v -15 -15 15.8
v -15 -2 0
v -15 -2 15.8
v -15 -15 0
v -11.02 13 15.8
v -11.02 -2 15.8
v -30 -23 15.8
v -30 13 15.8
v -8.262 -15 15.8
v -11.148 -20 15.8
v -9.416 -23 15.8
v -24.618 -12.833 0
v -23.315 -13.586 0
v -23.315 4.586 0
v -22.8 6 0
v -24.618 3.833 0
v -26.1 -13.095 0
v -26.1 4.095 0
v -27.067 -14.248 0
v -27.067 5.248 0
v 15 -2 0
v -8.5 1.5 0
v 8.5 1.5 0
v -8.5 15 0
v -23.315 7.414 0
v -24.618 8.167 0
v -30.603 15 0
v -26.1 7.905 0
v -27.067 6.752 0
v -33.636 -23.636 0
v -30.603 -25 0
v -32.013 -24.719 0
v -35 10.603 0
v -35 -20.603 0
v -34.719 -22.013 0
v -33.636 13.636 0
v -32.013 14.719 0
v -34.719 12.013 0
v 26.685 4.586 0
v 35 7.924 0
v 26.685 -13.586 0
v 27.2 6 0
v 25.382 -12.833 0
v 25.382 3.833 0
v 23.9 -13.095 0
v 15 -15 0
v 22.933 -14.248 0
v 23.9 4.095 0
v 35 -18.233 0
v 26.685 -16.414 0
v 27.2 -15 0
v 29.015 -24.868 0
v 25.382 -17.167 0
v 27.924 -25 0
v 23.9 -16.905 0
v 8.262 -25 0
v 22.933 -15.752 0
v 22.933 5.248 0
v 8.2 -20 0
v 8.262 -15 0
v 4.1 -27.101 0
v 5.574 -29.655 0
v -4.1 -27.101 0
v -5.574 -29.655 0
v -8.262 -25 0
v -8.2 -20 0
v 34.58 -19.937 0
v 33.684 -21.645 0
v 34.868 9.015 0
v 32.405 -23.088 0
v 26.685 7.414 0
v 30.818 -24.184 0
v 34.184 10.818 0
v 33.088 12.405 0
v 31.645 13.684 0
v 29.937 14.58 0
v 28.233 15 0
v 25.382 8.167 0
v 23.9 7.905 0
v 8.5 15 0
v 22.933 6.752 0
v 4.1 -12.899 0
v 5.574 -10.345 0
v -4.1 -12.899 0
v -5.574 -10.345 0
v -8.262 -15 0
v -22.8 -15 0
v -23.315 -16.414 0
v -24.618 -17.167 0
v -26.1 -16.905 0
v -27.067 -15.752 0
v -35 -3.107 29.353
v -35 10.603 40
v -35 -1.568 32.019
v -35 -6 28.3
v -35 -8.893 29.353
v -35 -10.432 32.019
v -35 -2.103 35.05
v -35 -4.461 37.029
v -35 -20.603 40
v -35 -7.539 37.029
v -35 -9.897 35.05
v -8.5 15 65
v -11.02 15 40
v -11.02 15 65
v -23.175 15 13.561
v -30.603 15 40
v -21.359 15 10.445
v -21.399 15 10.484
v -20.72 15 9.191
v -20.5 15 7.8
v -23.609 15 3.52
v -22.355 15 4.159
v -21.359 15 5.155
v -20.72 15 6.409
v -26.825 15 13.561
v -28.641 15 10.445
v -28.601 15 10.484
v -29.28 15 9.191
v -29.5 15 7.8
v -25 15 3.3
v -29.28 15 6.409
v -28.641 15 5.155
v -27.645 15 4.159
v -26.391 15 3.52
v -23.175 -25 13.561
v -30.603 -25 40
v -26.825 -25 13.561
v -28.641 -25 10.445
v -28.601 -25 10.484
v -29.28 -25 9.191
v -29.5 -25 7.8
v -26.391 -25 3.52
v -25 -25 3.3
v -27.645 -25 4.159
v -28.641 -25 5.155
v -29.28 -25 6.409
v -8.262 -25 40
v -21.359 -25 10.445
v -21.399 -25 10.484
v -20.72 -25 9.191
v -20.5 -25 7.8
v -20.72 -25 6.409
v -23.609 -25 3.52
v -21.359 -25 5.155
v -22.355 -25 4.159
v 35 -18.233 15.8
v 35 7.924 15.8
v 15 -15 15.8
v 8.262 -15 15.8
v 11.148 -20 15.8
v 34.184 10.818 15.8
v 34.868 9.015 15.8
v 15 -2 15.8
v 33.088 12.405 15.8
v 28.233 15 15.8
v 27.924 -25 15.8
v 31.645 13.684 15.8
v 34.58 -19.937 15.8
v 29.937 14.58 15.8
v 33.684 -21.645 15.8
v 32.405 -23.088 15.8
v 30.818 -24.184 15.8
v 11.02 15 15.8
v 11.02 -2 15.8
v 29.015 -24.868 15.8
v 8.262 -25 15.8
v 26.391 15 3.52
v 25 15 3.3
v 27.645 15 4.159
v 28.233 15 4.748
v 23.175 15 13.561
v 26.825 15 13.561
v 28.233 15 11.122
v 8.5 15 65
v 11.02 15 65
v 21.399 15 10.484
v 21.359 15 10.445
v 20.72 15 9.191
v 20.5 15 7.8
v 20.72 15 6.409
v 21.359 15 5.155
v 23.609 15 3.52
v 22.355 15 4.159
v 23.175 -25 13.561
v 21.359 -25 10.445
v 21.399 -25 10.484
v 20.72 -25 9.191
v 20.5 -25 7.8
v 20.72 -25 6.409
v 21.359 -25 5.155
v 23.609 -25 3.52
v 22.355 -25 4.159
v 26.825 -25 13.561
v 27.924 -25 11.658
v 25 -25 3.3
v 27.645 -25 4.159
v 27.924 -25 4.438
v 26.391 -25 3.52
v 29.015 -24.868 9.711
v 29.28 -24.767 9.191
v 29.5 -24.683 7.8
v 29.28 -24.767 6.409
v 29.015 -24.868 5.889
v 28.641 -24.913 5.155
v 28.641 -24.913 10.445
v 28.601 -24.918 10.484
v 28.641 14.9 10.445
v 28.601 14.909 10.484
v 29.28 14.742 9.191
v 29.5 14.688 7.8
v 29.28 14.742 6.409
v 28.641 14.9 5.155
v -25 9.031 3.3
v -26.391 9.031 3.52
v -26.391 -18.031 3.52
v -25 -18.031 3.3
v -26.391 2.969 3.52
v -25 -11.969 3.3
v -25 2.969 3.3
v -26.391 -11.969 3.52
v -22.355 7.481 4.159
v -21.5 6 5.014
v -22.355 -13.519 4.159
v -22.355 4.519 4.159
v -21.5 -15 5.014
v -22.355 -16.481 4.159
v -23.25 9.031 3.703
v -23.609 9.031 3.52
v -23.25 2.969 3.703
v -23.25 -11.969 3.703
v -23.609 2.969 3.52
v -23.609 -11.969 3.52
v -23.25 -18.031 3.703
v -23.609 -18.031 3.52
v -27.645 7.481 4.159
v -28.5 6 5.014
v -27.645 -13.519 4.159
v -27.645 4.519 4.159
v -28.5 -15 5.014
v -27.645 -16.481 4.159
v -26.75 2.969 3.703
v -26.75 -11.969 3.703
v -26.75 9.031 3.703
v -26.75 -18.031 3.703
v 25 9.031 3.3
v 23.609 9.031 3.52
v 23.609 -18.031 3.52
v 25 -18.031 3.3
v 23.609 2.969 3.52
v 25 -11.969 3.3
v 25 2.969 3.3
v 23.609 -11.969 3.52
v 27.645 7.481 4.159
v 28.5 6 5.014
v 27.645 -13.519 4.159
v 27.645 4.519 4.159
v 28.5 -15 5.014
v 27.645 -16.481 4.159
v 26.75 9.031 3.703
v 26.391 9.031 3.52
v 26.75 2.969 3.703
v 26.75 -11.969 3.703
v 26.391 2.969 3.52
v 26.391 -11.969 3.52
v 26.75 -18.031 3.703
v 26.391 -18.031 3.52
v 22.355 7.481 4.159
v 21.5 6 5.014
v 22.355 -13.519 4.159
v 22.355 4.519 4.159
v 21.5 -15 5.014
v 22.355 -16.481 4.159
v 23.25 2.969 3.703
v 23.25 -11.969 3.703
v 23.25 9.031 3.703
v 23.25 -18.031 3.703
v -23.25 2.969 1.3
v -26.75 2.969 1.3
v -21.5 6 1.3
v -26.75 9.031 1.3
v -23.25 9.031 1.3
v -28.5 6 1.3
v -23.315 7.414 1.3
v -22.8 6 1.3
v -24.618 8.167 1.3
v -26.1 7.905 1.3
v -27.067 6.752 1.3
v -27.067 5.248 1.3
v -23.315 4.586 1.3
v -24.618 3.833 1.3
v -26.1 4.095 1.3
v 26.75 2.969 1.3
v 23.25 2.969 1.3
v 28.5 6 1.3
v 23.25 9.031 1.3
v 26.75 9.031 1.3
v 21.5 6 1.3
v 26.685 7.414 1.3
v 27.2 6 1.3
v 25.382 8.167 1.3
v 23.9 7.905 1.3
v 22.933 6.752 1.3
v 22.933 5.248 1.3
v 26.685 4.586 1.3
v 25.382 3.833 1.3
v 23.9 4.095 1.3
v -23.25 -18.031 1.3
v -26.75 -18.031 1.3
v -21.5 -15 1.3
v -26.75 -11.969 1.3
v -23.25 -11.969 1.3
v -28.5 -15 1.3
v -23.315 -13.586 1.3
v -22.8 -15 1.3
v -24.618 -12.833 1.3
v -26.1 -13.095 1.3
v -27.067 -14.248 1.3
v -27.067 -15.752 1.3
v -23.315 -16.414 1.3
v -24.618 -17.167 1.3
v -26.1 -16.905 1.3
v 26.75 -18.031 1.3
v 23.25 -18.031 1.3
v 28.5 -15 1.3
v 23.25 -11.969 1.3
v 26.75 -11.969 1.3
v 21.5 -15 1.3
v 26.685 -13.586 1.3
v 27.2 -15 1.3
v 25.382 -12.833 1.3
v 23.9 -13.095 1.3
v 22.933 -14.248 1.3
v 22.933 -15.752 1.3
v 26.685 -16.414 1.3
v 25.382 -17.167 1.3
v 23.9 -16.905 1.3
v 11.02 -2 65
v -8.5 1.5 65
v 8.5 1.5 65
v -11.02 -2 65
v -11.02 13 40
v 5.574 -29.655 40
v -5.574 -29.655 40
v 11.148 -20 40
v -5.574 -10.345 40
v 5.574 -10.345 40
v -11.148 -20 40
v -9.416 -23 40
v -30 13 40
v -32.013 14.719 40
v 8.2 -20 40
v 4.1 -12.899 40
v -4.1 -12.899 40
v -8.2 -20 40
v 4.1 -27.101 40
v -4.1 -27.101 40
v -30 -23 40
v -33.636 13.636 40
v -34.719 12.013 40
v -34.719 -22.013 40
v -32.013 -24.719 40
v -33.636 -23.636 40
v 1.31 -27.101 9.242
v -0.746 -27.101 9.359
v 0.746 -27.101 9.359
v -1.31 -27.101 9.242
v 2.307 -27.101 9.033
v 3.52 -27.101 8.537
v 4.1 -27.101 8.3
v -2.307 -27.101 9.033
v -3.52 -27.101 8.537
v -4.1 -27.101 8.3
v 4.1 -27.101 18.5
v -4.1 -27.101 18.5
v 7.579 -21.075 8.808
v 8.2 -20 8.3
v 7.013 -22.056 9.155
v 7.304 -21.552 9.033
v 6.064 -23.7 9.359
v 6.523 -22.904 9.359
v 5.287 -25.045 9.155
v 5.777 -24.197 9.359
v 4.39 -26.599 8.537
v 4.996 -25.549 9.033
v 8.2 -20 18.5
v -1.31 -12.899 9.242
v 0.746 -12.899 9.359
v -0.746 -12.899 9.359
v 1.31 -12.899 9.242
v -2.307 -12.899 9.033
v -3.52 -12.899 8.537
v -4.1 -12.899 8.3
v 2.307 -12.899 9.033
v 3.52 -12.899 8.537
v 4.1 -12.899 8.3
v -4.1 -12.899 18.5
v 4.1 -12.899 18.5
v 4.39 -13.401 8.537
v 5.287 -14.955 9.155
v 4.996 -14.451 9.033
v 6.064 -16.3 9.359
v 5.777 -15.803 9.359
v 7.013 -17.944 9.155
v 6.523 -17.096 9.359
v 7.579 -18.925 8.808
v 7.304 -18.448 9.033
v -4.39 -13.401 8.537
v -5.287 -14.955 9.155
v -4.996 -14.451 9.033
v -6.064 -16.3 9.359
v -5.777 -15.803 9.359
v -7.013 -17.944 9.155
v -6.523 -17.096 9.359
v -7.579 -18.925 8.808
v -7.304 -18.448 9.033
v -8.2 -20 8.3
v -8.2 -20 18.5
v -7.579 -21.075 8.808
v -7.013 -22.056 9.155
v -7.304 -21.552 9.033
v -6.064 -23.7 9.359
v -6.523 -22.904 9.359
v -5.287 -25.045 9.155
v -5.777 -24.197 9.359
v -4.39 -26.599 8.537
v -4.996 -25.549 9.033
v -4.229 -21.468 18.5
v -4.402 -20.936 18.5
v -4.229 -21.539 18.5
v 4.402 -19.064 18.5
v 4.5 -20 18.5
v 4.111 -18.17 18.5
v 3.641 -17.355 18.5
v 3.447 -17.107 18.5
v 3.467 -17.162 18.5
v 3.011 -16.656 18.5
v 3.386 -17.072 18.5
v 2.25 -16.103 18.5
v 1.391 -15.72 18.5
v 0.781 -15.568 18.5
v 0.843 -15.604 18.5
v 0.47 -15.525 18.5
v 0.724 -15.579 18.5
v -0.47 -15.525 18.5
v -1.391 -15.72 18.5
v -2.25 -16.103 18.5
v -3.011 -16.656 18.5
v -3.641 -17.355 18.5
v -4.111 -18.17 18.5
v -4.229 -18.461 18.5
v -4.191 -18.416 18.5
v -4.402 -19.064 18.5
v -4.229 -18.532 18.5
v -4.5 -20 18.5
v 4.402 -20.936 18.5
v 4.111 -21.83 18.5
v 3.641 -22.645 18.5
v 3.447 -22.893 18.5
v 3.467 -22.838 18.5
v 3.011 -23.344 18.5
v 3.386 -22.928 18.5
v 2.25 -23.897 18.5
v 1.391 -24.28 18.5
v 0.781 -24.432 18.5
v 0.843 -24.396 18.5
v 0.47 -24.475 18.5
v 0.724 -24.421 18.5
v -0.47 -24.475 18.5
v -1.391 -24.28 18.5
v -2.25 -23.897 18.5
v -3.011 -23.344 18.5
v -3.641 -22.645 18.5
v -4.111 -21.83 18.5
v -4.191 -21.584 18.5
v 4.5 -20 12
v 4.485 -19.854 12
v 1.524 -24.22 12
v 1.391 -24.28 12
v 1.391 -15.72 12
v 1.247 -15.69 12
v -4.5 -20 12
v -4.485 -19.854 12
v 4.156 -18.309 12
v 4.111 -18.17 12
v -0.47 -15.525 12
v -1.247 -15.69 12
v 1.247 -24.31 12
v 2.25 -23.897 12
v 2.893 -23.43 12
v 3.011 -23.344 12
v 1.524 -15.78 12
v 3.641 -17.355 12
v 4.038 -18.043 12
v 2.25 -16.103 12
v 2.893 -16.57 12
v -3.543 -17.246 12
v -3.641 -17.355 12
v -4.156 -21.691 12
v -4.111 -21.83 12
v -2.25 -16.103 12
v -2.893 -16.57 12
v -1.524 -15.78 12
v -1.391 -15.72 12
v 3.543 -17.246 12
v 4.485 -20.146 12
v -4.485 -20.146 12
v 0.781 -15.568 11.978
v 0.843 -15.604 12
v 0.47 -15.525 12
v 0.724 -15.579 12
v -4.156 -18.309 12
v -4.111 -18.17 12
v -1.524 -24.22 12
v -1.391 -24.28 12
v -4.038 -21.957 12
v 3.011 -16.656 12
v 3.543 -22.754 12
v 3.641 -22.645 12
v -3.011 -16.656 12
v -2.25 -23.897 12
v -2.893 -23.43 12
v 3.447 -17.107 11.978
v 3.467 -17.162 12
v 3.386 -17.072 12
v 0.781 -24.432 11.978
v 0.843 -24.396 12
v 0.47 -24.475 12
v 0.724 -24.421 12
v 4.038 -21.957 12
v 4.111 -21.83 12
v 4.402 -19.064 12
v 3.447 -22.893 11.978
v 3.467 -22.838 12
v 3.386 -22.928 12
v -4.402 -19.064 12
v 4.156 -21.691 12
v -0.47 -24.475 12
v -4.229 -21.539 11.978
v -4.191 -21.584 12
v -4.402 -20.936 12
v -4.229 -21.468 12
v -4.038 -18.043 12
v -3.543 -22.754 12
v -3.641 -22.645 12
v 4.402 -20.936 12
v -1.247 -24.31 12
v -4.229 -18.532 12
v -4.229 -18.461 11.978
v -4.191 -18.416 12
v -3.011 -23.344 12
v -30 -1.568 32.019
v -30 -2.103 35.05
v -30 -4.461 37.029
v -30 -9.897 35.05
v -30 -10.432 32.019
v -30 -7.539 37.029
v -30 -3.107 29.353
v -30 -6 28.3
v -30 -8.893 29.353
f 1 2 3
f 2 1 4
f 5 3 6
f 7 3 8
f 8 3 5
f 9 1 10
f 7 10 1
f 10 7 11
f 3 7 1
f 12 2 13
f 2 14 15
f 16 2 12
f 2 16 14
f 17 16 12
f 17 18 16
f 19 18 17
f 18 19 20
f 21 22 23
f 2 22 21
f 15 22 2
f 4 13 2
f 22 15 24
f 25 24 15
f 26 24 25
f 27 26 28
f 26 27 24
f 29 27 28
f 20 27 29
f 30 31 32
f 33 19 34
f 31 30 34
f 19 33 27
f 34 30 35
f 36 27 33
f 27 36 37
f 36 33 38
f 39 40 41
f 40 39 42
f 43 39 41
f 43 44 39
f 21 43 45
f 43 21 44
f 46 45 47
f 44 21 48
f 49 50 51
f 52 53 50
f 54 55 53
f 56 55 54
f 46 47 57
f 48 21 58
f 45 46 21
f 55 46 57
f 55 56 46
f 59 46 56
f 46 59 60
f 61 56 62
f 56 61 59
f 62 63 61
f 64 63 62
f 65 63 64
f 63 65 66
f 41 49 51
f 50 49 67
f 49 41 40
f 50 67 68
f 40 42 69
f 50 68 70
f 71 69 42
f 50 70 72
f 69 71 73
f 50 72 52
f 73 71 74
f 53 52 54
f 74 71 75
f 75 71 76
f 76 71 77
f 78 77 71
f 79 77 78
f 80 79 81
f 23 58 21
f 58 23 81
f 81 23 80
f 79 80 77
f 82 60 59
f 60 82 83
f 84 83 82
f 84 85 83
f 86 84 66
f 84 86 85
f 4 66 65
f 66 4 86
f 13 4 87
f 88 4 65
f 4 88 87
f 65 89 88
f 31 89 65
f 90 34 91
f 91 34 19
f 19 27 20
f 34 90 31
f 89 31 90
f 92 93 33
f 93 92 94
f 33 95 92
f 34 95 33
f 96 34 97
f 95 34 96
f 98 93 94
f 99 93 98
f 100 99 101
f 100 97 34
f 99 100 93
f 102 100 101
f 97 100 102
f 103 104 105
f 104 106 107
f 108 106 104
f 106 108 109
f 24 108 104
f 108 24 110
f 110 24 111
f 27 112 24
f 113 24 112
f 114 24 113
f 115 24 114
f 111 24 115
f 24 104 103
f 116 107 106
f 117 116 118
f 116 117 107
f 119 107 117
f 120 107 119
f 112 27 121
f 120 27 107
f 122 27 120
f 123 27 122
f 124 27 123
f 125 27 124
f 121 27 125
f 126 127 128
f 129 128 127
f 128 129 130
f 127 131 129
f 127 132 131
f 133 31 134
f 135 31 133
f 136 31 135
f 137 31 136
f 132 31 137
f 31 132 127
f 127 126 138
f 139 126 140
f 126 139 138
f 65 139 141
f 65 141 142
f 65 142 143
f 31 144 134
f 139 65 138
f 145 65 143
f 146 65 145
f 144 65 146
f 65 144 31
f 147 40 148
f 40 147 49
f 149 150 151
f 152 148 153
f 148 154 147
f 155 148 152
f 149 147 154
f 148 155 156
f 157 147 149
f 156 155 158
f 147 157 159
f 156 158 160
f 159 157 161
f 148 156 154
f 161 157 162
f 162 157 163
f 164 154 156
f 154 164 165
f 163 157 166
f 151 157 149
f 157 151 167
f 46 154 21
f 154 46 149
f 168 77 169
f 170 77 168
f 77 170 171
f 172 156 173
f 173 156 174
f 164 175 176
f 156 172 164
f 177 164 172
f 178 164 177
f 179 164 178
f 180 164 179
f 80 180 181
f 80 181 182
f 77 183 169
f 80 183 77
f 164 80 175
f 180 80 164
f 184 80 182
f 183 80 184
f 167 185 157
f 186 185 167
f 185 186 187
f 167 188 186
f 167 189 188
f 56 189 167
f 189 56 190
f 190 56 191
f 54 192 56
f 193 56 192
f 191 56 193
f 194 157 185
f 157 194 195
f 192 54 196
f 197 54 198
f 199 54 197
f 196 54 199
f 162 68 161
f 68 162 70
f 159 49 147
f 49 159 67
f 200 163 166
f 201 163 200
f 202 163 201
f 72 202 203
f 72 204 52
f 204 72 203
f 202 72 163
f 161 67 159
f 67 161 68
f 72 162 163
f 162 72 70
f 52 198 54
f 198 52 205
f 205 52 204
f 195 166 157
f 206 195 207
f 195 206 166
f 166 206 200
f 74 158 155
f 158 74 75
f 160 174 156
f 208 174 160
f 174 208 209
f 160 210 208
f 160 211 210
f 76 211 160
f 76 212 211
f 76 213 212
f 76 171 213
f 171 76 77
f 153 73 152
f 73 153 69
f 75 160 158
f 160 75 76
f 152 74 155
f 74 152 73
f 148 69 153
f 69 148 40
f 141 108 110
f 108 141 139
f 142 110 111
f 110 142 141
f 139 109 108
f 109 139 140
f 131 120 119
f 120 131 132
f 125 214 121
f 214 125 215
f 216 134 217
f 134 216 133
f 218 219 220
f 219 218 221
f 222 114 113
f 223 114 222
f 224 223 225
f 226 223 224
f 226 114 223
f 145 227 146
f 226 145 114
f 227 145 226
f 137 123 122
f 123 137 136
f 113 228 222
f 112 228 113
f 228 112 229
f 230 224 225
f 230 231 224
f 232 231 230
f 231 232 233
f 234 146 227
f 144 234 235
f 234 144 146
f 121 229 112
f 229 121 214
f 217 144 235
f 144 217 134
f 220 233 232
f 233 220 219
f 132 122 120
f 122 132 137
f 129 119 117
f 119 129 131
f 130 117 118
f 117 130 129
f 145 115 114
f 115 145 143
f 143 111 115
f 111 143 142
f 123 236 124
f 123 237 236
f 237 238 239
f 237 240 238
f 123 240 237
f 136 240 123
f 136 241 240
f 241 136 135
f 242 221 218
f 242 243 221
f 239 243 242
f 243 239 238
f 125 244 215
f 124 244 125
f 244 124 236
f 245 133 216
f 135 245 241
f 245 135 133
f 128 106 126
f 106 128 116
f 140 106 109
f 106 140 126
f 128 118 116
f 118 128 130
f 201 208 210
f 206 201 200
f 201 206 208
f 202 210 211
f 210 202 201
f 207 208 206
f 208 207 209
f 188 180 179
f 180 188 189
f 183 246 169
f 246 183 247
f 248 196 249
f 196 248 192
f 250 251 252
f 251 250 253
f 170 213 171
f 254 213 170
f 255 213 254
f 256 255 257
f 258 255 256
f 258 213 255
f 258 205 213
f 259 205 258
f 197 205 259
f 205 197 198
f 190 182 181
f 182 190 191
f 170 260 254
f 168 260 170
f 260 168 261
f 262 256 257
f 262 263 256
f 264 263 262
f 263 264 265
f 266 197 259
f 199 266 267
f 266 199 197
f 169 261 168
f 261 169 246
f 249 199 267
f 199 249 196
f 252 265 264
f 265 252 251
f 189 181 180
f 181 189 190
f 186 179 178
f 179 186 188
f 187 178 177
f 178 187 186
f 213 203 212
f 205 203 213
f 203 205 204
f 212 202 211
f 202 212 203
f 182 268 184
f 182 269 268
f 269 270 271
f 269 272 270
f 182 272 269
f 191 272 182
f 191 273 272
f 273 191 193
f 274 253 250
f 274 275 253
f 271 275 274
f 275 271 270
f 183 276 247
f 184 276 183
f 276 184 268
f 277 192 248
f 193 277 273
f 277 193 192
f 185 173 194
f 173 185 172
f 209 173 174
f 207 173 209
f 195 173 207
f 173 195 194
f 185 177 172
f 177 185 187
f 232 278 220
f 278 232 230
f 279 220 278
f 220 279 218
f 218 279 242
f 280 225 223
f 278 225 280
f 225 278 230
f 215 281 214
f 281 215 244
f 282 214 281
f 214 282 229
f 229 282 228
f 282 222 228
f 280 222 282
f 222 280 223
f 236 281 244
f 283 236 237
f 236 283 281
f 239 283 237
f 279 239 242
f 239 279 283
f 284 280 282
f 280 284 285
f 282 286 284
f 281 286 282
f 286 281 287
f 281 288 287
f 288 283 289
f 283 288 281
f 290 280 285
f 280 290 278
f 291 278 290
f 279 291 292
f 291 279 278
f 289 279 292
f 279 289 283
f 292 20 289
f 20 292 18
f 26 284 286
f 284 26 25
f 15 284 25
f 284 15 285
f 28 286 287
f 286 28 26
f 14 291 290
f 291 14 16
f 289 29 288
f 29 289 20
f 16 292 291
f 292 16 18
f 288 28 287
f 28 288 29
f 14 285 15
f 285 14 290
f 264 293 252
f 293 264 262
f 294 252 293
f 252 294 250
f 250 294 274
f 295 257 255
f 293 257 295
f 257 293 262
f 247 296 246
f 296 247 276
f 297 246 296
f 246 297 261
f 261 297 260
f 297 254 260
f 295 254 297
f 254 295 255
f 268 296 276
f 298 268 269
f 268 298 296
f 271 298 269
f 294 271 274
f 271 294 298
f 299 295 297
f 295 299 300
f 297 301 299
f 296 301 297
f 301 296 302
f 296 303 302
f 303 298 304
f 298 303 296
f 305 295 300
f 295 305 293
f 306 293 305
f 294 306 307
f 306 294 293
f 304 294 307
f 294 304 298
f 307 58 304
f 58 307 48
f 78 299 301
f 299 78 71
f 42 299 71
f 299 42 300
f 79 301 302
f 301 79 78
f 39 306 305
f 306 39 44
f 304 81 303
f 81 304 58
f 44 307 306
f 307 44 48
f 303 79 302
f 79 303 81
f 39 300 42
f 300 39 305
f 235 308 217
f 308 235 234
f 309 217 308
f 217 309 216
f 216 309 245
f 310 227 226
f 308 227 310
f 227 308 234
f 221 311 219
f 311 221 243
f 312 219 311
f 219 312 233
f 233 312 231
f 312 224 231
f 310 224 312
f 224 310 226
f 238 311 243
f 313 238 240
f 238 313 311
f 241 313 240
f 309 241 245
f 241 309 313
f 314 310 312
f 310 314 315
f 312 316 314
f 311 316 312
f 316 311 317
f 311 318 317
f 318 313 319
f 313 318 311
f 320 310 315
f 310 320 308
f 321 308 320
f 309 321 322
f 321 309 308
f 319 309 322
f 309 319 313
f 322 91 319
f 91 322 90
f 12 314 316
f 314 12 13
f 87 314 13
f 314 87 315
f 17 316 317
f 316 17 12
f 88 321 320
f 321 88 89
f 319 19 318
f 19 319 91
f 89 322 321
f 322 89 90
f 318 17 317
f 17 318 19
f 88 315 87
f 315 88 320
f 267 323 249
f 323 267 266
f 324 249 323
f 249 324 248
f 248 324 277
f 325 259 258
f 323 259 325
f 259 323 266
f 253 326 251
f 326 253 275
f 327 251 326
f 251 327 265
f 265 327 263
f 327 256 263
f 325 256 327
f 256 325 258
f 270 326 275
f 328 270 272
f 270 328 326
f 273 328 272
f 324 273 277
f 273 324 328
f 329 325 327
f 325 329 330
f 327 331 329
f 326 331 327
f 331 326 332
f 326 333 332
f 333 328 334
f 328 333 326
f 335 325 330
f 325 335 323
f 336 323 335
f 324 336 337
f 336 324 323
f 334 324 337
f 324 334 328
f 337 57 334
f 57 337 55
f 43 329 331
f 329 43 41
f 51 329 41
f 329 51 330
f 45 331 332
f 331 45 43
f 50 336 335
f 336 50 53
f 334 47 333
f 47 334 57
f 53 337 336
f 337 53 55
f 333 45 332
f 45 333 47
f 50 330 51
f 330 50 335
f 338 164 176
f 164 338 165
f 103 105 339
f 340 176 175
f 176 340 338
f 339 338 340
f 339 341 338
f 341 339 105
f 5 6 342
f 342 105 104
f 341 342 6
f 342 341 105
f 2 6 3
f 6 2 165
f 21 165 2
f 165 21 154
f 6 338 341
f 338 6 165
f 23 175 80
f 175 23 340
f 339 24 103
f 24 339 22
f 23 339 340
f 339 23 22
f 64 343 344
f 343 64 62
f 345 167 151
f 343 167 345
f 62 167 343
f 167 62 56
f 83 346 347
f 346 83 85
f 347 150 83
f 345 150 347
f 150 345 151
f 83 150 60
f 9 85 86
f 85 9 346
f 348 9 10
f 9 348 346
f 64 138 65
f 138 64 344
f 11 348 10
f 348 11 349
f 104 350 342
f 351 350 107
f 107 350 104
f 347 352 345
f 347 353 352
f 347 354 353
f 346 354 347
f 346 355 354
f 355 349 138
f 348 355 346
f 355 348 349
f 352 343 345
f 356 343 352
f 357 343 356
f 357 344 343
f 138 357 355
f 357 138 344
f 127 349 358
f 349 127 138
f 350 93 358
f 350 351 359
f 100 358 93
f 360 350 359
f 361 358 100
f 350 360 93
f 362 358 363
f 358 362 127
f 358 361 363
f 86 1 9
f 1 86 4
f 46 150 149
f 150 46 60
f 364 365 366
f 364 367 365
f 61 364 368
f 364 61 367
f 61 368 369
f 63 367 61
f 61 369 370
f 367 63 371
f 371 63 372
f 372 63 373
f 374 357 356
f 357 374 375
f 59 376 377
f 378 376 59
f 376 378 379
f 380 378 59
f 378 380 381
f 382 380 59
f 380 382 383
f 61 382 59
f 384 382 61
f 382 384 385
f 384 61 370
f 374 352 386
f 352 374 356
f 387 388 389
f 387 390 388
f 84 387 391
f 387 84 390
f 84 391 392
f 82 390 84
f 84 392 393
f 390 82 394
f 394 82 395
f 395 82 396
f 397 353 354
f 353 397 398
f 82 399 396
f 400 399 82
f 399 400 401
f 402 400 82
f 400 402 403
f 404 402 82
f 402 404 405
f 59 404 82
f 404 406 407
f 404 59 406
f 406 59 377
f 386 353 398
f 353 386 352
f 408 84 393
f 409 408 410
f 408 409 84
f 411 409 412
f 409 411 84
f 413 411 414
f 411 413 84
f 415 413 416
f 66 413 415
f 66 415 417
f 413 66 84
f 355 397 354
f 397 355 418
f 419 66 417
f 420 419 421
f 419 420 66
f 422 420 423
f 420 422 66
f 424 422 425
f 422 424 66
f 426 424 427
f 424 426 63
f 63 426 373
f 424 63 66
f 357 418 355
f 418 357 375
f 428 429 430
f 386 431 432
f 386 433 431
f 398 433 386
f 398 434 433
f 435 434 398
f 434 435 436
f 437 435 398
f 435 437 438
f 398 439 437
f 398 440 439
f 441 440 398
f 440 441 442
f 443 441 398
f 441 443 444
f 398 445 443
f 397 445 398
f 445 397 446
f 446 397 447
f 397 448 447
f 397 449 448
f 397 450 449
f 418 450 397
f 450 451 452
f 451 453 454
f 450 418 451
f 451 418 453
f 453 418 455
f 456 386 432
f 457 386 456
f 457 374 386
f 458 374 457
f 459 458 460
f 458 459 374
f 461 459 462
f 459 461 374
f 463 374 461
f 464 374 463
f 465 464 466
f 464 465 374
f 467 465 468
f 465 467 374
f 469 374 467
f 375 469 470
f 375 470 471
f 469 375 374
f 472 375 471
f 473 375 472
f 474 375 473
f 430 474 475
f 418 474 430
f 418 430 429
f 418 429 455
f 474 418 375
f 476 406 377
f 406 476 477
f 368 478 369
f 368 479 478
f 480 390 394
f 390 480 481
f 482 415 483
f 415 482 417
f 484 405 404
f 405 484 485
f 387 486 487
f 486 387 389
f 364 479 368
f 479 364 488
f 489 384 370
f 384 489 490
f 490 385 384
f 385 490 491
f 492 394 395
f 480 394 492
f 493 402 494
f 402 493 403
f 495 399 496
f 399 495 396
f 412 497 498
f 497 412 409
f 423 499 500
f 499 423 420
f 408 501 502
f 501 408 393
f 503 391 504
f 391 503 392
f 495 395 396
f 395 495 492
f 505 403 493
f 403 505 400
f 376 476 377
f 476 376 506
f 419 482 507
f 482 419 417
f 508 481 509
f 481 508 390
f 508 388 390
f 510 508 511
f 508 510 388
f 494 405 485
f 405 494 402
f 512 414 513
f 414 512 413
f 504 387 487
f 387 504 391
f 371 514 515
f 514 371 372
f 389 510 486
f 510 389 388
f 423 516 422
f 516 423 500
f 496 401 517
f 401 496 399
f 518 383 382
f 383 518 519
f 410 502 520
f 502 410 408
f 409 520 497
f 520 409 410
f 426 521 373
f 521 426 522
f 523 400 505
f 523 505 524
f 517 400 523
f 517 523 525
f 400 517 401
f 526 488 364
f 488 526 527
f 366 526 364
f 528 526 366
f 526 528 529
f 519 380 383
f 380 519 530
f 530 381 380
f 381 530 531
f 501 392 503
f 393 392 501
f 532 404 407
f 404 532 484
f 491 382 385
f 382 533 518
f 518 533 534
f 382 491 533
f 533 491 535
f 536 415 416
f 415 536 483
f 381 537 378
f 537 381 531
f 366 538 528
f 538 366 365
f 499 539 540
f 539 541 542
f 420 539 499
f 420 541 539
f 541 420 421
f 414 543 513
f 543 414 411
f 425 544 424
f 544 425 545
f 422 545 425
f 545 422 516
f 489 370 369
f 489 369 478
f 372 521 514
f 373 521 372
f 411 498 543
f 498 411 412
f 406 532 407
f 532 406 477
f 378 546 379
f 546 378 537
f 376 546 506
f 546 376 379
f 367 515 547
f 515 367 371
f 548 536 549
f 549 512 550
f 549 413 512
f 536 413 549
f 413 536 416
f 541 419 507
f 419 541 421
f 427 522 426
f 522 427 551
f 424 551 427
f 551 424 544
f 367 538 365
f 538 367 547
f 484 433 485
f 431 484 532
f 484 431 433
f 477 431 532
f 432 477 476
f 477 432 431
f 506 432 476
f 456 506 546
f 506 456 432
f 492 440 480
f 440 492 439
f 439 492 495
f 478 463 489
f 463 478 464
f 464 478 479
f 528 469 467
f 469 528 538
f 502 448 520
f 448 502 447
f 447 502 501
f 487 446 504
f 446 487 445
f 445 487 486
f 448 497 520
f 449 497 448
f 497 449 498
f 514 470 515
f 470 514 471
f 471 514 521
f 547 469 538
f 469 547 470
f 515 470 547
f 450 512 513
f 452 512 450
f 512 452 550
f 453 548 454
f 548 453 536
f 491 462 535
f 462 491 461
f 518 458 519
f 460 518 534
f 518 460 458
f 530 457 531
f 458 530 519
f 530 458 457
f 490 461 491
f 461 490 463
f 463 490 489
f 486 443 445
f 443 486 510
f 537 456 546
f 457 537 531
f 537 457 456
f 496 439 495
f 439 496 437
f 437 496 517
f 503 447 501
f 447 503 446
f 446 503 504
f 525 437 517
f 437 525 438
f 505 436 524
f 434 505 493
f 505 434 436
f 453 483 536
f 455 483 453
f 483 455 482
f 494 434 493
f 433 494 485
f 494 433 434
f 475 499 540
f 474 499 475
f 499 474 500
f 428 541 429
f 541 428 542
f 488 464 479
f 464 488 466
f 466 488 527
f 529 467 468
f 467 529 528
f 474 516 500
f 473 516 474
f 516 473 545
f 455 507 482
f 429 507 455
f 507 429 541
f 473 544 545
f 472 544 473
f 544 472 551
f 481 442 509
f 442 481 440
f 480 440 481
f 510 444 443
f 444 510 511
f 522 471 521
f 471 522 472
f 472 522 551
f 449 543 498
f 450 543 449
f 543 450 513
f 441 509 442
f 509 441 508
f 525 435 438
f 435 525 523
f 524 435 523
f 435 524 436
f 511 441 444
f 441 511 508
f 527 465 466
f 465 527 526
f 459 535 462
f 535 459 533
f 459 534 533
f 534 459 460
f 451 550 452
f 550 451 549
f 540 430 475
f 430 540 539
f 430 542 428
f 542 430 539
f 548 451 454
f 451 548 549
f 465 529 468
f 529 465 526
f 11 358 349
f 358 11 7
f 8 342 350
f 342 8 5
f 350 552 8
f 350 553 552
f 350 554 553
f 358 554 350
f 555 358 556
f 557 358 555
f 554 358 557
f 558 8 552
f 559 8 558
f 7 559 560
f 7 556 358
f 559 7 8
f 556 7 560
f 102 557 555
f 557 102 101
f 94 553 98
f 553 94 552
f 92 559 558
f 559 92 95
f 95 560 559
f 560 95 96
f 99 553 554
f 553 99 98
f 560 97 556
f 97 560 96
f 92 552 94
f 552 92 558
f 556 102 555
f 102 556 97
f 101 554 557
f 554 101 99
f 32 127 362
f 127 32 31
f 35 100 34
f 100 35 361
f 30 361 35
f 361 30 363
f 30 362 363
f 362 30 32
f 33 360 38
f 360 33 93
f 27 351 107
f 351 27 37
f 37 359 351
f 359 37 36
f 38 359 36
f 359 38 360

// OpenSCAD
// file: ../configuration.scad
// PRUSA Mendel  
// Configuration file
// GNU GPL v2
// Josef Pra
// josefprusa@me.com
// prusadjs.cz
// http://www.reprap.org/wiki/Prusa_Mendel
// http://github.com/prusajr/PrusaMendel


// PLEASE SELECT ONE OF THE CONFIGURATIONS BELOW
// BY UN-COMMENTING IT


variant=0; //0 for metric
//variant=1; //1 for SAE
if(variant==0){
echo("variant: metric");
}else if(variant==1){
echo("variant: sae");
} else{
echo("WARNING: INVALID CONFIGURATION");
}




vars=[
//[m8_dia, m8_nut, m4_dia, m4_nut, m3_dia, m3_nut, bush_dia, mot_shaft, bush_rod, bush_outerdia, bush_length]
[9,16.4,5,9,4.4,7,11,5.3,8,16,11],//metric
[9,15.7,5.5,10.6,5.5,10.6,11.5,5.3,7.9375,16,11]//SAE
];


//BUSHING TYPE Can generate three versions
// 1 - regular old ones
// 2 - helical ones
// 3 - holders for brass or any other bought bushings
bushing_type = 2;


//Round corner diameter
round_corner_diameter = 8;


//Thin wall size
layer_height = 0.4;
perimeter_width_over_thicknes = 1.6;
infill_widht_over_thickness = 1.55;
thin_wall = 2*(perimeter_width_over_thicknes*layer_height+infill_widht_over_thickness*layer_height);
if(thin_wall<2){
	echo("Check thin wall size, its below 2mm!");
}
echo(thin_wall);


//DO NOT TOUCH THIS SECTION!
m8_diameter = vars[variant][0];
m8_nut_diameter = vars[variant][1];
m4_diameter = vars[variant][2];
m4_nut_diameter = vars[variant][3];
m3_diameter = vars[variant][4];
m3_nut_diameter = vars[variant][5];
bushing_diameter = vars[variant][6];
motor_shaft=vars[variant][7];
bushing_rodsize = vars[variant][8];
bushing_outerDiameter = vars[variant][9];
bushing_lenght = vars[variant][10];




// MINI-HUXLEY VERSION (TODO, just place holder)
// include <configuration-huxley.scad>


// MEGA VERSION (TODO, just place holder)
// include <configuration-mega.scad>




// Some basic functions, probably should be somewhere else
module roundcorner(diameter){
	difference(){
		cube(size = [diameter,diameter,99], center = false);
		translate(v = [diameter, diameter, 0]) cylinder(h = 100, r=diameter, center=true);
	}
}
// main file
// PRUSA Mendel  
// X-end with idler mount
// GNU GPL v2
// Josef Průša
// josefprusa@me.com
// prusadjs.cz
// http://www.reprap.org/wiki/Prusa_Mendel
// http://github.com/prusajr/PrusaMendel

include <../configuration.scad>
corection = 1.17; 

/**
 *@name X end idler
 *@using 2 bushing
 *@using 1 m8spring
 *@using 2 m8nut
 */

module xendidler(){
difference(){
translate(v = [0,35,24.5]) union(){ 

difference(){
union(){
translate(v = [-25, -40, -16.6])cube(size = [20,40,15.8], center = true);
translate(v = [25, -40, -16.6])cube(size = [20,40,15.8], center = true);
}
//nut traps

translate(v = [-25, -29, -19.7]) cylinder(h = 7, r=m3_nut_diameter/2, $fn=6, center=true);
translate(v = [-25, -29, -20]) cylinder(h = 10, r=m3_diameter/2, $fn=9, center=true);
translate(v = [25, -29, -19.7]) cylinder(h = 7, r=m3_nut_diameter/2, $fn=6, center=true);
translate(v = [25, -29, -20]) cylinder(h = 10, r=m3_diameter/2, $fn=9, center=true);

translate(v = [-25, -50, -19.7]) cylinder(h = 7, r=m3_nut_diameter/2, $fn=6, center=true);
translate(v = [-25, -50, -20]) cylinder(h = 10, r=m3_diameter/2, $fn=9, center=true);
translate(v = [25, -50, -19.7]) cylinder(h = 7, r=m3_nut_diameter/2, $fn=6, center=true);
translate(v = [25, -50, -20]) cylinder(h = 10, r=m3_diameter/2, $fn=9, center=true);


//round corners
translate(v = [35.1, -60.1, -25]) rotate(a=[0,0,90]) roundcorner(round_corner_diameter);
translate(v = [35.1, -19.9, -25]) rotate(a=[0,0,-180]) roundcorner(round_corner_diameter);


//holes for X axis
translate(v = [-25, -18, -16.7]) rotate(a=[90,0,0]) {
	translate(v = [0, 0, 22]) cylinder(h = 42, r=4.5, $fn=20, center=true);
	translate(v = [0, 2.60, 22]) rotate(a=[0,0,0]) cylinder(h = 42, r=3.65, $fn=6, center=true);
}
translate(v = [25, -18, -16.7]) rotate(a=[90,0,0]) {
	translate(v = [0, 0, 22]) cylinder(h = 42, r=4.5, $fn=20, center=true);
	translate(v = [0, 2.60, 22]) rotate(a=[0,0,0]) cylinder(h = 42, r=3.65, $fn=6, center=true);
}
//slider cutouts
translate(v = [0, -25, 15]) 
	difference(){
	translate(v = [0, -0, -14.5])cube(size = [23,23,50], center = true);
	}
//nut trap
translate(v = [0, -55, 15]) {
	difference(){
	translate(v = [0, -0, -15])cylinder(h = 50, r=m8_nut_diameter/2+thin_wall, $fn=6, center=true);
	}
}
}

//slider
translate(v = [0, -25, 15]) 
	difference(){
union(){
	translate(v = [0, -3.5, -7]) cube(size = [17+2*thin_wall,17,65], center = true);

	translate(v = [0, -3.5, -31.6]) cube(size = [33,17,15.8], center = true);}
	translate(v = [0, -0, -7])cube(size = [17,17,70], center = true);}

//nut trap
//correction for thin wall



translate(v = [0, -55, 15]) {
difference(){
	union(){difference(){
union(){
	translate(v = [0, -0, -19.5])cylinder(h = 40, r=m8_nut_diameter/2+thin_wall*corection, $fn=6, center=true);
	translate(v = [0, 0, -31.6]) cube(size = [35,10,15.8], center = true);
	}
	cylinder(h = 90, r=m8_nut_diameter/2, $fn=6, center=true);
	}

// Generate nut barrier with conical lead in under.  Replace this...

	//translate(v = [10, 0, -31]) cylinder(h = 4, r=m8_nut_diameter/2+thin_wall, $fn=6, center=true);

// ... with this--------
	difference()
	{
	translate(v = [0, 0, -29]) cylinder(h = 16, r=m8_nut_diameter/2+thin_wall, $fn=6, center=true);
	translate(v = [0, 0, -32]) cylinder(h = 10, r1=10+4, r2=4, $fn=30, center=true);
	cylinder(h = 100, r=4.5, $fn=30, center=true);
	}

//---------

	}
	translate(v = [0, 0, 12.5]) cylinder(h = 90, r=m8_diameter/2, $fn=9, center=true);
}
}


//idler wheel connector
mirror(){
translate(v = [0, -35, -12]) difference(){
union(){
translate(v = [21, -24, 15]) cube(size = [25.5,2,25], center = true); // New web
translate(v = [21, 14, 15]) cube(size = [24,2,25], center = true); // New web
translate(v = [32.5, -5, 12.5]) cube(size = [5,40,30], center = true);
}

translate(v = [32.5, -6, 28-3-4.7]) rotate(a=[0,90,0]) cylinder(h = 90, r=m8_diameter/2, $fn=9, center=true);
//translate(v = [35.1,-25.1,-5]) rotate(a=[0,0,90]) roundcorner(3);
//translate(v = [-35.1, -19.9, -25]) rotate(a=[0,0,-90]) roundcorner(3);

}
}}

//two more rounded corners
translate(v = [-35.1,-25.1,-5]) rotate(a=[0,0,0]) roundcorner(5);
translate(v = [-35.1, +15.1, -5]) rotate(a=[0,0,-90]) roundcorner(5);
}
}




xendidler();
